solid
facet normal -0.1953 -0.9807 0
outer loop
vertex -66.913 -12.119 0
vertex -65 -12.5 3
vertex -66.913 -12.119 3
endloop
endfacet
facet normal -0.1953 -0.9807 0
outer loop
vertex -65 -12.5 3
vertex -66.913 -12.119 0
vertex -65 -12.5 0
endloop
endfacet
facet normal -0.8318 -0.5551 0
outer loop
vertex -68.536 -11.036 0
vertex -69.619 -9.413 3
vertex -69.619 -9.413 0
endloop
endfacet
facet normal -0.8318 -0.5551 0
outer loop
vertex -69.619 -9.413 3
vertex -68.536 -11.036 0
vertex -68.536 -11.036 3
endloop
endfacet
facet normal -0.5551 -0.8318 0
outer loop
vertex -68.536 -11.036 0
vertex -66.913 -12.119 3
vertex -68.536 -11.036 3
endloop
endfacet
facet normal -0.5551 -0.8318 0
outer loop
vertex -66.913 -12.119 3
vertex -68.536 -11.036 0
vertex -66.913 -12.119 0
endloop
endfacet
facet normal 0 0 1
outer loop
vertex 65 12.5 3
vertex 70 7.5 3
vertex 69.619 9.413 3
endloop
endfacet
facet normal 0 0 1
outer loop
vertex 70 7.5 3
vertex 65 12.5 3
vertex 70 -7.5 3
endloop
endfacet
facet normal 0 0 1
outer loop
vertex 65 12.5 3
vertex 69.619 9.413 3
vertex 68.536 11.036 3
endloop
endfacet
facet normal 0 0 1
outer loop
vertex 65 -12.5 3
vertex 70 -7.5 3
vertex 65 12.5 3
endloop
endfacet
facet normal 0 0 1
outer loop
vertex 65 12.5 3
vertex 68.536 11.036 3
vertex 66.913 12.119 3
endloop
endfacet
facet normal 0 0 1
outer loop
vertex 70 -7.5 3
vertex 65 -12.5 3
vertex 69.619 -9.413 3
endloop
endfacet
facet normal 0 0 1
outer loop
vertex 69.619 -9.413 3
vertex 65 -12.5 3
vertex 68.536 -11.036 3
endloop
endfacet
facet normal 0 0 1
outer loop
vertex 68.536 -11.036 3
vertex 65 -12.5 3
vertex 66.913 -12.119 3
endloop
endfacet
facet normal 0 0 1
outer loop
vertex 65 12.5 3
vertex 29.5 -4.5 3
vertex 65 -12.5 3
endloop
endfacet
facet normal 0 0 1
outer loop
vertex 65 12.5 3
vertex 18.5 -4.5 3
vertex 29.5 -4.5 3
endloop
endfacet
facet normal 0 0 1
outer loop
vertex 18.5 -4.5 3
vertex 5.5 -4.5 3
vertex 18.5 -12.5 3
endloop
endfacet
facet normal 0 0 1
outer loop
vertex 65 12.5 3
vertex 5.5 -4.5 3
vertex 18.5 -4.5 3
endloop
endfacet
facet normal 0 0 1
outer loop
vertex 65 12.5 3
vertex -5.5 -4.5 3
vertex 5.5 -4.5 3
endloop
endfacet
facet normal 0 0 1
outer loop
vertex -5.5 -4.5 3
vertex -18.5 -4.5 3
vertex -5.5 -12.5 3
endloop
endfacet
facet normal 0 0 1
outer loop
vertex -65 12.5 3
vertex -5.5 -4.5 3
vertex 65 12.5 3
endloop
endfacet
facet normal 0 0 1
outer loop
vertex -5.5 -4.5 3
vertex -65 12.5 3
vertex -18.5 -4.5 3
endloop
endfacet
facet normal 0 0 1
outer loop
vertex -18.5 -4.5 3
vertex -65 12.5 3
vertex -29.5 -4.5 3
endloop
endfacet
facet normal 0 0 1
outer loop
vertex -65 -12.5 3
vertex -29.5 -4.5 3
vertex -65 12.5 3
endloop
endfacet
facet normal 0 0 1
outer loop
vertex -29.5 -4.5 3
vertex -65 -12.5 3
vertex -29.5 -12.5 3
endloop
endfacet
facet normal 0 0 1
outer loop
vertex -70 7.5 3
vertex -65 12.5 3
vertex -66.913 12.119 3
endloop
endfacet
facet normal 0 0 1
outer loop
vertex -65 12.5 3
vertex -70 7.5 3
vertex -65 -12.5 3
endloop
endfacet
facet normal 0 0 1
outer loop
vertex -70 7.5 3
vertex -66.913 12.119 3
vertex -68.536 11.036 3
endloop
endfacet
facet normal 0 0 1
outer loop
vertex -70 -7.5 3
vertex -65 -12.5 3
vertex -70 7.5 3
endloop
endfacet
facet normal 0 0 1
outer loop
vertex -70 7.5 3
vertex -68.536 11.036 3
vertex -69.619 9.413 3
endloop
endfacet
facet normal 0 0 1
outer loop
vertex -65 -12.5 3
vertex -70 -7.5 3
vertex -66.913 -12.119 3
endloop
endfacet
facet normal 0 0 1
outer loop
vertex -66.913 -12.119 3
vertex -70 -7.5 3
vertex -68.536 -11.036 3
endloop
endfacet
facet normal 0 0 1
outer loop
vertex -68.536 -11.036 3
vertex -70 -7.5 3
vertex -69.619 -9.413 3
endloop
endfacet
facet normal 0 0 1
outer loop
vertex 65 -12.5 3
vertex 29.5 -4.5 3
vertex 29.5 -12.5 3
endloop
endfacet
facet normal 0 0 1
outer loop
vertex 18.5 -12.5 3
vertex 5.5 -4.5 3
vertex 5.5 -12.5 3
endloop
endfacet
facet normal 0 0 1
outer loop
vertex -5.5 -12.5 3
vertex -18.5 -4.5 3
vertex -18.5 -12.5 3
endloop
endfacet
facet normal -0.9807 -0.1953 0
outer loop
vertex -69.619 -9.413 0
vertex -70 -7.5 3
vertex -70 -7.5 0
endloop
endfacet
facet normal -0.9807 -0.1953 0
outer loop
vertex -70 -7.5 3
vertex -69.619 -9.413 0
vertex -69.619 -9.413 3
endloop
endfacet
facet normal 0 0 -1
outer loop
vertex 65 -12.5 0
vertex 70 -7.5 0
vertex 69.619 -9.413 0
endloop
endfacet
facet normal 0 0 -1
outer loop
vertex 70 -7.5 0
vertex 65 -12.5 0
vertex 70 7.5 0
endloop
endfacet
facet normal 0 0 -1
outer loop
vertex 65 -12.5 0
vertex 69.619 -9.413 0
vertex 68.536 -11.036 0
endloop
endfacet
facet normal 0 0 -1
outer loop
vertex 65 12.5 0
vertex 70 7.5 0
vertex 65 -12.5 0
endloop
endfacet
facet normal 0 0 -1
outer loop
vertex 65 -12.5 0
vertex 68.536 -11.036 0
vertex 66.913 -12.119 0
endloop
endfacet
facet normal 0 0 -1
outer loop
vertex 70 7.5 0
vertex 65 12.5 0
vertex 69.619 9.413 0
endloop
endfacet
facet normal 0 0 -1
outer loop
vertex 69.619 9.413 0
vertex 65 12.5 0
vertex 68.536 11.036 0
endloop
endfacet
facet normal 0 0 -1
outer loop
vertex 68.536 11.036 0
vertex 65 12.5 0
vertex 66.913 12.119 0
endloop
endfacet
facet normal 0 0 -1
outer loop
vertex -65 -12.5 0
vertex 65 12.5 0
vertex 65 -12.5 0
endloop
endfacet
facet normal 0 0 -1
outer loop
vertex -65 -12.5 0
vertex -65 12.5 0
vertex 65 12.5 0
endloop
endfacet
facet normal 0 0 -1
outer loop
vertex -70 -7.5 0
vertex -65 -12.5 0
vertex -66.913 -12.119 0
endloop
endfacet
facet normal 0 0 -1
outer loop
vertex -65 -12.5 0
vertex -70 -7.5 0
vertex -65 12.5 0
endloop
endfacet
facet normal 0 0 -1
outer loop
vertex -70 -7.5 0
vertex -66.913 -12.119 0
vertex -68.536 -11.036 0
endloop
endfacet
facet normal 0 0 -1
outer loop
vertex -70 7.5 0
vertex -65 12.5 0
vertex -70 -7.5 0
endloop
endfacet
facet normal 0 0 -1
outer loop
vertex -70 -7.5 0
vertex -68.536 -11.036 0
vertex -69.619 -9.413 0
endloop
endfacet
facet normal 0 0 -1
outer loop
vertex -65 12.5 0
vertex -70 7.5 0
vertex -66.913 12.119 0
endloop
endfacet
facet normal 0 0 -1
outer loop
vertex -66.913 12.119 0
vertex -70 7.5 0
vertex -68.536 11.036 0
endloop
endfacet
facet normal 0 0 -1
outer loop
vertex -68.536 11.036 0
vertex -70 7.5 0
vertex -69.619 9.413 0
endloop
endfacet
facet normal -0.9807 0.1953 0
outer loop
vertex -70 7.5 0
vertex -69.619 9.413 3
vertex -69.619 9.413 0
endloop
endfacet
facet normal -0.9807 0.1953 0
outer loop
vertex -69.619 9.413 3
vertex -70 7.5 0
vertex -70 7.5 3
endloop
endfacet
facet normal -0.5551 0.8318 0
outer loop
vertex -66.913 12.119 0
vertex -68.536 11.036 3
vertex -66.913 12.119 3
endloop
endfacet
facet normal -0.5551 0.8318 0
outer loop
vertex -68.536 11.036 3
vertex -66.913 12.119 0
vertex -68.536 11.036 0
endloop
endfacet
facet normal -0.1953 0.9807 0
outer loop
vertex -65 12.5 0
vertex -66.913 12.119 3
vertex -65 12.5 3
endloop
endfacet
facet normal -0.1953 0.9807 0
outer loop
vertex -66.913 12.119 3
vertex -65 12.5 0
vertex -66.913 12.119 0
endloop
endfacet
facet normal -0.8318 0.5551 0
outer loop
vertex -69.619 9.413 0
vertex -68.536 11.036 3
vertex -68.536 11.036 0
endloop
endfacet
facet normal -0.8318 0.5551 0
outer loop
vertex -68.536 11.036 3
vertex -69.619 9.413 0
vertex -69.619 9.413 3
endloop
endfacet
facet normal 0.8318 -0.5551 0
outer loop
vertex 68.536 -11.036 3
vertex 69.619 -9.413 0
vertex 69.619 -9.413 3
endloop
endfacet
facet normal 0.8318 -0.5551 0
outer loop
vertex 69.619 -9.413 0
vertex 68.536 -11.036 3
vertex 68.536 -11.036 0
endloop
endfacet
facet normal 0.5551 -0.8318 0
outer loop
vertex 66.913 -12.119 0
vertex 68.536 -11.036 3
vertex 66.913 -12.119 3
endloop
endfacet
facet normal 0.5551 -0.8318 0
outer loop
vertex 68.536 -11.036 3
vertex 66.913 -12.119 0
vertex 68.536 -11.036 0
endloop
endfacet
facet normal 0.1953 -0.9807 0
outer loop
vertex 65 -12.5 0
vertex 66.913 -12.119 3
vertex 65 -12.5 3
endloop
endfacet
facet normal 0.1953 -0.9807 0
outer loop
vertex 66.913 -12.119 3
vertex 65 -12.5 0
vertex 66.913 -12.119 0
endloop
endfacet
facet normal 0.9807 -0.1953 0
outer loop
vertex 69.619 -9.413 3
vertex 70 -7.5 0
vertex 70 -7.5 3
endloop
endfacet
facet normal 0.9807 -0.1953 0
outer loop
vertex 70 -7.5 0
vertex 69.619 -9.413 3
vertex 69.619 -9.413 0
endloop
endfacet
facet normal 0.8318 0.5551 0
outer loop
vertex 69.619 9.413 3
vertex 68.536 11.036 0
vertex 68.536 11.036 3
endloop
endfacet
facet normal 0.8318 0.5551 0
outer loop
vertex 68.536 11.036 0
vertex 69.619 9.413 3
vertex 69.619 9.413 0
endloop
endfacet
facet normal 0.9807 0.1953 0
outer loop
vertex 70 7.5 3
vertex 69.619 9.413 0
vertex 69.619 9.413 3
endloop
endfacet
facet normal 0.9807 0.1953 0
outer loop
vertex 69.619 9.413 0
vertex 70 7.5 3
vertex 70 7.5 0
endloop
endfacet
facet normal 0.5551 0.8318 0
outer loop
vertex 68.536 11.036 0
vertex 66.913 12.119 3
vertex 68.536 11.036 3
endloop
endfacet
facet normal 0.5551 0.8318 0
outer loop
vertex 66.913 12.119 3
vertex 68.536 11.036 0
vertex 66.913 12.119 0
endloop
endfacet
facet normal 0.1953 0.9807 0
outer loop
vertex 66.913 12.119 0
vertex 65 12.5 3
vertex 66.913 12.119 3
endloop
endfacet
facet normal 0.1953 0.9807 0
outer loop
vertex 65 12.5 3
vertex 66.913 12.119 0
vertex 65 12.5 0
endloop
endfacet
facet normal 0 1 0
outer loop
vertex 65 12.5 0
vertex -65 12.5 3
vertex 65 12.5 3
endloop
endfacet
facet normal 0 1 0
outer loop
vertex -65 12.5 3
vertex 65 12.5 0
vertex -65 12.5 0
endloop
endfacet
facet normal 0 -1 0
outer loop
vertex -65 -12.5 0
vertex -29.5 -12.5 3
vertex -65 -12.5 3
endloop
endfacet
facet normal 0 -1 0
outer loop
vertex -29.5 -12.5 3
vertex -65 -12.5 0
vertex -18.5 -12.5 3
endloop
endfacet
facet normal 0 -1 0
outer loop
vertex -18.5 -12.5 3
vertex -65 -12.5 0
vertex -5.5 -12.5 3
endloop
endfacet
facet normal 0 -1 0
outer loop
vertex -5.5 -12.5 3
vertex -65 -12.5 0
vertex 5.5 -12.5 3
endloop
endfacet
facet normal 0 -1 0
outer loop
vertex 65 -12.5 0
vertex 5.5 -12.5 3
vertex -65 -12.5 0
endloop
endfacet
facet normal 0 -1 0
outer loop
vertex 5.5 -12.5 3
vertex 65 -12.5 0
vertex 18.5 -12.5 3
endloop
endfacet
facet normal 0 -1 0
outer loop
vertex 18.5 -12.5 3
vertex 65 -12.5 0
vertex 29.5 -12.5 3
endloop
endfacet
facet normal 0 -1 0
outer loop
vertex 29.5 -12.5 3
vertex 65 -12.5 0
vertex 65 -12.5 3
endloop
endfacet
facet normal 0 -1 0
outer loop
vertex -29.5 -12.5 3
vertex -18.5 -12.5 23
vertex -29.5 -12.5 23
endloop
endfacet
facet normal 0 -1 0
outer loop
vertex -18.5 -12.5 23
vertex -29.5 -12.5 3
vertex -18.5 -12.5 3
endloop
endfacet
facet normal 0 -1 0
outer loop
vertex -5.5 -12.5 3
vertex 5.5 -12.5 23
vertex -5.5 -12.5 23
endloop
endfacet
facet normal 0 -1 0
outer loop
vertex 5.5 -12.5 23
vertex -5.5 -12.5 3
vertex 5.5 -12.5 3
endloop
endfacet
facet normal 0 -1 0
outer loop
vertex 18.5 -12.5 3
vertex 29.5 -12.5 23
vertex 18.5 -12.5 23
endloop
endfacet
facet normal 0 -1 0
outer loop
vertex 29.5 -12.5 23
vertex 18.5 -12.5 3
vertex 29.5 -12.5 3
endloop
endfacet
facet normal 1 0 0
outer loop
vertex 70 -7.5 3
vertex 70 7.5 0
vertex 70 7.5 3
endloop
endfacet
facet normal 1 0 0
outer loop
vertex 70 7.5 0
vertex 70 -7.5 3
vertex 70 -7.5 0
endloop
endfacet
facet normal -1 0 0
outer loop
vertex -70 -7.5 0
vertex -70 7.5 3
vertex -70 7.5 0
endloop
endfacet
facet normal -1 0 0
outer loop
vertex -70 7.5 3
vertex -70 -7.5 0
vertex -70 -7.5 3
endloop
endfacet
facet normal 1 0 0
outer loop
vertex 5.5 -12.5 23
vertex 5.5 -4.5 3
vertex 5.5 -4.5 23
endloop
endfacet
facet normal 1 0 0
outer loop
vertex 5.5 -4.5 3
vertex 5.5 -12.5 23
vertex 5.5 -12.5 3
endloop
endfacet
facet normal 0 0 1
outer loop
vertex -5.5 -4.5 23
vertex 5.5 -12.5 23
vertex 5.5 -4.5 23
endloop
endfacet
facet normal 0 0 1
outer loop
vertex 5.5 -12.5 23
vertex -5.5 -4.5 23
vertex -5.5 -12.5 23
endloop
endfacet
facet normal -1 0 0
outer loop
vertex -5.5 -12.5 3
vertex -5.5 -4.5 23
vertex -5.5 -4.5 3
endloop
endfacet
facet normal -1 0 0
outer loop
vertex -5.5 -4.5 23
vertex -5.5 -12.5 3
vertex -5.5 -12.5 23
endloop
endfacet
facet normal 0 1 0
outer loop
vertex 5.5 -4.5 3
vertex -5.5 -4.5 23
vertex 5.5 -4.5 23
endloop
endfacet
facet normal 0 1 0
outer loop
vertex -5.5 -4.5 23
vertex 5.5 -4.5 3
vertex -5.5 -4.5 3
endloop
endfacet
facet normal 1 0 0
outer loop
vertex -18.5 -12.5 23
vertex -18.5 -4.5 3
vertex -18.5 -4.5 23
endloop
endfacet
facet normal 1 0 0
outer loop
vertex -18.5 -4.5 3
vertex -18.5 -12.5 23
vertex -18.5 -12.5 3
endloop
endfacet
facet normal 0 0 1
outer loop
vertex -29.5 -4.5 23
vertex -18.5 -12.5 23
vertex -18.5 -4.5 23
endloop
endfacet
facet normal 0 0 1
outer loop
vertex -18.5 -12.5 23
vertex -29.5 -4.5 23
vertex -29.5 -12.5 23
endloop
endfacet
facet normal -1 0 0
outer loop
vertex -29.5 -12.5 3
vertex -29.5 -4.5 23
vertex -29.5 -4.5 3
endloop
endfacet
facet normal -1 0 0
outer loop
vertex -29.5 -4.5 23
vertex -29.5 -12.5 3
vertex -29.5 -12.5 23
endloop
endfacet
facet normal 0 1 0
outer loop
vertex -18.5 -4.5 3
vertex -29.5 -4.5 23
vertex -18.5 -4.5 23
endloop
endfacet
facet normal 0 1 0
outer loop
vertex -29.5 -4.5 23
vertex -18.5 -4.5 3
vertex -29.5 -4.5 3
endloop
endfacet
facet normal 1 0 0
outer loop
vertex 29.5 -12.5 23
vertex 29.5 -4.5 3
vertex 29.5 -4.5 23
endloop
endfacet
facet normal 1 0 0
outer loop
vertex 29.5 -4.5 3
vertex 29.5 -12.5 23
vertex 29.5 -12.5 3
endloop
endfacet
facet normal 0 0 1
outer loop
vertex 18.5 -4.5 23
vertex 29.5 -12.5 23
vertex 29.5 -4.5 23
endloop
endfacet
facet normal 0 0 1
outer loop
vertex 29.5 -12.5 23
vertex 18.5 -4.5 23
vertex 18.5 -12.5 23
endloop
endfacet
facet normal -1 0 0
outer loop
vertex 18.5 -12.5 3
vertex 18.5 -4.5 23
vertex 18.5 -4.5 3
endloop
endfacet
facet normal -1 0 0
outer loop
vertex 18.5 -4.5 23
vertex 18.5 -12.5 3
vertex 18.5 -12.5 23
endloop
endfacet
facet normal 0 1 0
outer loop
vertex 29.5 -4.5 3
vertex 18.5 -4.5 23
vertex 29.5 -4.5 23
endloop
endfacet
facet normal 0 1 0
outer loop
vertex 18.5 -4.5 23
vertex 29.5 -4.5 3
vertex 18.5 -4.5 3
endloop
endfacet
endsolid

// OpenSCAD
use <MCAD/boxes.scad>

base_length=140;
base_width=25;
base_height=3;


module plain_plate()
{
  corner_radius=5;
  translate([0,0,base_height/2])roundedBox(size=[base_length,base_width,base_height],radius=corner_radius,sidesonly=true);
}

module wood_grain()
{
linear_extrude(height = 1, center = true, convexity = 10)
   import (file = "woodgrain.dxf");
}

module plate()
{
  difference()
  {
    plain_plate();
    translate([45,0,0])scale([1.3,1,1])rotate([0,0,90])wood_grain();  
  }
}


module peg()
{
  width=11;
  height=8;
  length=20;
  translate([-width/2,0,0])cube([width,height,length]);
  
}

module end_plate()
{
  plate();
  translate([0,-base_width/2,base_height])peg();
  translate([-24,-base_width/2,base_height])peg();
  translate([24,-base_width/2,base_height])peg();
}

end_plate();
